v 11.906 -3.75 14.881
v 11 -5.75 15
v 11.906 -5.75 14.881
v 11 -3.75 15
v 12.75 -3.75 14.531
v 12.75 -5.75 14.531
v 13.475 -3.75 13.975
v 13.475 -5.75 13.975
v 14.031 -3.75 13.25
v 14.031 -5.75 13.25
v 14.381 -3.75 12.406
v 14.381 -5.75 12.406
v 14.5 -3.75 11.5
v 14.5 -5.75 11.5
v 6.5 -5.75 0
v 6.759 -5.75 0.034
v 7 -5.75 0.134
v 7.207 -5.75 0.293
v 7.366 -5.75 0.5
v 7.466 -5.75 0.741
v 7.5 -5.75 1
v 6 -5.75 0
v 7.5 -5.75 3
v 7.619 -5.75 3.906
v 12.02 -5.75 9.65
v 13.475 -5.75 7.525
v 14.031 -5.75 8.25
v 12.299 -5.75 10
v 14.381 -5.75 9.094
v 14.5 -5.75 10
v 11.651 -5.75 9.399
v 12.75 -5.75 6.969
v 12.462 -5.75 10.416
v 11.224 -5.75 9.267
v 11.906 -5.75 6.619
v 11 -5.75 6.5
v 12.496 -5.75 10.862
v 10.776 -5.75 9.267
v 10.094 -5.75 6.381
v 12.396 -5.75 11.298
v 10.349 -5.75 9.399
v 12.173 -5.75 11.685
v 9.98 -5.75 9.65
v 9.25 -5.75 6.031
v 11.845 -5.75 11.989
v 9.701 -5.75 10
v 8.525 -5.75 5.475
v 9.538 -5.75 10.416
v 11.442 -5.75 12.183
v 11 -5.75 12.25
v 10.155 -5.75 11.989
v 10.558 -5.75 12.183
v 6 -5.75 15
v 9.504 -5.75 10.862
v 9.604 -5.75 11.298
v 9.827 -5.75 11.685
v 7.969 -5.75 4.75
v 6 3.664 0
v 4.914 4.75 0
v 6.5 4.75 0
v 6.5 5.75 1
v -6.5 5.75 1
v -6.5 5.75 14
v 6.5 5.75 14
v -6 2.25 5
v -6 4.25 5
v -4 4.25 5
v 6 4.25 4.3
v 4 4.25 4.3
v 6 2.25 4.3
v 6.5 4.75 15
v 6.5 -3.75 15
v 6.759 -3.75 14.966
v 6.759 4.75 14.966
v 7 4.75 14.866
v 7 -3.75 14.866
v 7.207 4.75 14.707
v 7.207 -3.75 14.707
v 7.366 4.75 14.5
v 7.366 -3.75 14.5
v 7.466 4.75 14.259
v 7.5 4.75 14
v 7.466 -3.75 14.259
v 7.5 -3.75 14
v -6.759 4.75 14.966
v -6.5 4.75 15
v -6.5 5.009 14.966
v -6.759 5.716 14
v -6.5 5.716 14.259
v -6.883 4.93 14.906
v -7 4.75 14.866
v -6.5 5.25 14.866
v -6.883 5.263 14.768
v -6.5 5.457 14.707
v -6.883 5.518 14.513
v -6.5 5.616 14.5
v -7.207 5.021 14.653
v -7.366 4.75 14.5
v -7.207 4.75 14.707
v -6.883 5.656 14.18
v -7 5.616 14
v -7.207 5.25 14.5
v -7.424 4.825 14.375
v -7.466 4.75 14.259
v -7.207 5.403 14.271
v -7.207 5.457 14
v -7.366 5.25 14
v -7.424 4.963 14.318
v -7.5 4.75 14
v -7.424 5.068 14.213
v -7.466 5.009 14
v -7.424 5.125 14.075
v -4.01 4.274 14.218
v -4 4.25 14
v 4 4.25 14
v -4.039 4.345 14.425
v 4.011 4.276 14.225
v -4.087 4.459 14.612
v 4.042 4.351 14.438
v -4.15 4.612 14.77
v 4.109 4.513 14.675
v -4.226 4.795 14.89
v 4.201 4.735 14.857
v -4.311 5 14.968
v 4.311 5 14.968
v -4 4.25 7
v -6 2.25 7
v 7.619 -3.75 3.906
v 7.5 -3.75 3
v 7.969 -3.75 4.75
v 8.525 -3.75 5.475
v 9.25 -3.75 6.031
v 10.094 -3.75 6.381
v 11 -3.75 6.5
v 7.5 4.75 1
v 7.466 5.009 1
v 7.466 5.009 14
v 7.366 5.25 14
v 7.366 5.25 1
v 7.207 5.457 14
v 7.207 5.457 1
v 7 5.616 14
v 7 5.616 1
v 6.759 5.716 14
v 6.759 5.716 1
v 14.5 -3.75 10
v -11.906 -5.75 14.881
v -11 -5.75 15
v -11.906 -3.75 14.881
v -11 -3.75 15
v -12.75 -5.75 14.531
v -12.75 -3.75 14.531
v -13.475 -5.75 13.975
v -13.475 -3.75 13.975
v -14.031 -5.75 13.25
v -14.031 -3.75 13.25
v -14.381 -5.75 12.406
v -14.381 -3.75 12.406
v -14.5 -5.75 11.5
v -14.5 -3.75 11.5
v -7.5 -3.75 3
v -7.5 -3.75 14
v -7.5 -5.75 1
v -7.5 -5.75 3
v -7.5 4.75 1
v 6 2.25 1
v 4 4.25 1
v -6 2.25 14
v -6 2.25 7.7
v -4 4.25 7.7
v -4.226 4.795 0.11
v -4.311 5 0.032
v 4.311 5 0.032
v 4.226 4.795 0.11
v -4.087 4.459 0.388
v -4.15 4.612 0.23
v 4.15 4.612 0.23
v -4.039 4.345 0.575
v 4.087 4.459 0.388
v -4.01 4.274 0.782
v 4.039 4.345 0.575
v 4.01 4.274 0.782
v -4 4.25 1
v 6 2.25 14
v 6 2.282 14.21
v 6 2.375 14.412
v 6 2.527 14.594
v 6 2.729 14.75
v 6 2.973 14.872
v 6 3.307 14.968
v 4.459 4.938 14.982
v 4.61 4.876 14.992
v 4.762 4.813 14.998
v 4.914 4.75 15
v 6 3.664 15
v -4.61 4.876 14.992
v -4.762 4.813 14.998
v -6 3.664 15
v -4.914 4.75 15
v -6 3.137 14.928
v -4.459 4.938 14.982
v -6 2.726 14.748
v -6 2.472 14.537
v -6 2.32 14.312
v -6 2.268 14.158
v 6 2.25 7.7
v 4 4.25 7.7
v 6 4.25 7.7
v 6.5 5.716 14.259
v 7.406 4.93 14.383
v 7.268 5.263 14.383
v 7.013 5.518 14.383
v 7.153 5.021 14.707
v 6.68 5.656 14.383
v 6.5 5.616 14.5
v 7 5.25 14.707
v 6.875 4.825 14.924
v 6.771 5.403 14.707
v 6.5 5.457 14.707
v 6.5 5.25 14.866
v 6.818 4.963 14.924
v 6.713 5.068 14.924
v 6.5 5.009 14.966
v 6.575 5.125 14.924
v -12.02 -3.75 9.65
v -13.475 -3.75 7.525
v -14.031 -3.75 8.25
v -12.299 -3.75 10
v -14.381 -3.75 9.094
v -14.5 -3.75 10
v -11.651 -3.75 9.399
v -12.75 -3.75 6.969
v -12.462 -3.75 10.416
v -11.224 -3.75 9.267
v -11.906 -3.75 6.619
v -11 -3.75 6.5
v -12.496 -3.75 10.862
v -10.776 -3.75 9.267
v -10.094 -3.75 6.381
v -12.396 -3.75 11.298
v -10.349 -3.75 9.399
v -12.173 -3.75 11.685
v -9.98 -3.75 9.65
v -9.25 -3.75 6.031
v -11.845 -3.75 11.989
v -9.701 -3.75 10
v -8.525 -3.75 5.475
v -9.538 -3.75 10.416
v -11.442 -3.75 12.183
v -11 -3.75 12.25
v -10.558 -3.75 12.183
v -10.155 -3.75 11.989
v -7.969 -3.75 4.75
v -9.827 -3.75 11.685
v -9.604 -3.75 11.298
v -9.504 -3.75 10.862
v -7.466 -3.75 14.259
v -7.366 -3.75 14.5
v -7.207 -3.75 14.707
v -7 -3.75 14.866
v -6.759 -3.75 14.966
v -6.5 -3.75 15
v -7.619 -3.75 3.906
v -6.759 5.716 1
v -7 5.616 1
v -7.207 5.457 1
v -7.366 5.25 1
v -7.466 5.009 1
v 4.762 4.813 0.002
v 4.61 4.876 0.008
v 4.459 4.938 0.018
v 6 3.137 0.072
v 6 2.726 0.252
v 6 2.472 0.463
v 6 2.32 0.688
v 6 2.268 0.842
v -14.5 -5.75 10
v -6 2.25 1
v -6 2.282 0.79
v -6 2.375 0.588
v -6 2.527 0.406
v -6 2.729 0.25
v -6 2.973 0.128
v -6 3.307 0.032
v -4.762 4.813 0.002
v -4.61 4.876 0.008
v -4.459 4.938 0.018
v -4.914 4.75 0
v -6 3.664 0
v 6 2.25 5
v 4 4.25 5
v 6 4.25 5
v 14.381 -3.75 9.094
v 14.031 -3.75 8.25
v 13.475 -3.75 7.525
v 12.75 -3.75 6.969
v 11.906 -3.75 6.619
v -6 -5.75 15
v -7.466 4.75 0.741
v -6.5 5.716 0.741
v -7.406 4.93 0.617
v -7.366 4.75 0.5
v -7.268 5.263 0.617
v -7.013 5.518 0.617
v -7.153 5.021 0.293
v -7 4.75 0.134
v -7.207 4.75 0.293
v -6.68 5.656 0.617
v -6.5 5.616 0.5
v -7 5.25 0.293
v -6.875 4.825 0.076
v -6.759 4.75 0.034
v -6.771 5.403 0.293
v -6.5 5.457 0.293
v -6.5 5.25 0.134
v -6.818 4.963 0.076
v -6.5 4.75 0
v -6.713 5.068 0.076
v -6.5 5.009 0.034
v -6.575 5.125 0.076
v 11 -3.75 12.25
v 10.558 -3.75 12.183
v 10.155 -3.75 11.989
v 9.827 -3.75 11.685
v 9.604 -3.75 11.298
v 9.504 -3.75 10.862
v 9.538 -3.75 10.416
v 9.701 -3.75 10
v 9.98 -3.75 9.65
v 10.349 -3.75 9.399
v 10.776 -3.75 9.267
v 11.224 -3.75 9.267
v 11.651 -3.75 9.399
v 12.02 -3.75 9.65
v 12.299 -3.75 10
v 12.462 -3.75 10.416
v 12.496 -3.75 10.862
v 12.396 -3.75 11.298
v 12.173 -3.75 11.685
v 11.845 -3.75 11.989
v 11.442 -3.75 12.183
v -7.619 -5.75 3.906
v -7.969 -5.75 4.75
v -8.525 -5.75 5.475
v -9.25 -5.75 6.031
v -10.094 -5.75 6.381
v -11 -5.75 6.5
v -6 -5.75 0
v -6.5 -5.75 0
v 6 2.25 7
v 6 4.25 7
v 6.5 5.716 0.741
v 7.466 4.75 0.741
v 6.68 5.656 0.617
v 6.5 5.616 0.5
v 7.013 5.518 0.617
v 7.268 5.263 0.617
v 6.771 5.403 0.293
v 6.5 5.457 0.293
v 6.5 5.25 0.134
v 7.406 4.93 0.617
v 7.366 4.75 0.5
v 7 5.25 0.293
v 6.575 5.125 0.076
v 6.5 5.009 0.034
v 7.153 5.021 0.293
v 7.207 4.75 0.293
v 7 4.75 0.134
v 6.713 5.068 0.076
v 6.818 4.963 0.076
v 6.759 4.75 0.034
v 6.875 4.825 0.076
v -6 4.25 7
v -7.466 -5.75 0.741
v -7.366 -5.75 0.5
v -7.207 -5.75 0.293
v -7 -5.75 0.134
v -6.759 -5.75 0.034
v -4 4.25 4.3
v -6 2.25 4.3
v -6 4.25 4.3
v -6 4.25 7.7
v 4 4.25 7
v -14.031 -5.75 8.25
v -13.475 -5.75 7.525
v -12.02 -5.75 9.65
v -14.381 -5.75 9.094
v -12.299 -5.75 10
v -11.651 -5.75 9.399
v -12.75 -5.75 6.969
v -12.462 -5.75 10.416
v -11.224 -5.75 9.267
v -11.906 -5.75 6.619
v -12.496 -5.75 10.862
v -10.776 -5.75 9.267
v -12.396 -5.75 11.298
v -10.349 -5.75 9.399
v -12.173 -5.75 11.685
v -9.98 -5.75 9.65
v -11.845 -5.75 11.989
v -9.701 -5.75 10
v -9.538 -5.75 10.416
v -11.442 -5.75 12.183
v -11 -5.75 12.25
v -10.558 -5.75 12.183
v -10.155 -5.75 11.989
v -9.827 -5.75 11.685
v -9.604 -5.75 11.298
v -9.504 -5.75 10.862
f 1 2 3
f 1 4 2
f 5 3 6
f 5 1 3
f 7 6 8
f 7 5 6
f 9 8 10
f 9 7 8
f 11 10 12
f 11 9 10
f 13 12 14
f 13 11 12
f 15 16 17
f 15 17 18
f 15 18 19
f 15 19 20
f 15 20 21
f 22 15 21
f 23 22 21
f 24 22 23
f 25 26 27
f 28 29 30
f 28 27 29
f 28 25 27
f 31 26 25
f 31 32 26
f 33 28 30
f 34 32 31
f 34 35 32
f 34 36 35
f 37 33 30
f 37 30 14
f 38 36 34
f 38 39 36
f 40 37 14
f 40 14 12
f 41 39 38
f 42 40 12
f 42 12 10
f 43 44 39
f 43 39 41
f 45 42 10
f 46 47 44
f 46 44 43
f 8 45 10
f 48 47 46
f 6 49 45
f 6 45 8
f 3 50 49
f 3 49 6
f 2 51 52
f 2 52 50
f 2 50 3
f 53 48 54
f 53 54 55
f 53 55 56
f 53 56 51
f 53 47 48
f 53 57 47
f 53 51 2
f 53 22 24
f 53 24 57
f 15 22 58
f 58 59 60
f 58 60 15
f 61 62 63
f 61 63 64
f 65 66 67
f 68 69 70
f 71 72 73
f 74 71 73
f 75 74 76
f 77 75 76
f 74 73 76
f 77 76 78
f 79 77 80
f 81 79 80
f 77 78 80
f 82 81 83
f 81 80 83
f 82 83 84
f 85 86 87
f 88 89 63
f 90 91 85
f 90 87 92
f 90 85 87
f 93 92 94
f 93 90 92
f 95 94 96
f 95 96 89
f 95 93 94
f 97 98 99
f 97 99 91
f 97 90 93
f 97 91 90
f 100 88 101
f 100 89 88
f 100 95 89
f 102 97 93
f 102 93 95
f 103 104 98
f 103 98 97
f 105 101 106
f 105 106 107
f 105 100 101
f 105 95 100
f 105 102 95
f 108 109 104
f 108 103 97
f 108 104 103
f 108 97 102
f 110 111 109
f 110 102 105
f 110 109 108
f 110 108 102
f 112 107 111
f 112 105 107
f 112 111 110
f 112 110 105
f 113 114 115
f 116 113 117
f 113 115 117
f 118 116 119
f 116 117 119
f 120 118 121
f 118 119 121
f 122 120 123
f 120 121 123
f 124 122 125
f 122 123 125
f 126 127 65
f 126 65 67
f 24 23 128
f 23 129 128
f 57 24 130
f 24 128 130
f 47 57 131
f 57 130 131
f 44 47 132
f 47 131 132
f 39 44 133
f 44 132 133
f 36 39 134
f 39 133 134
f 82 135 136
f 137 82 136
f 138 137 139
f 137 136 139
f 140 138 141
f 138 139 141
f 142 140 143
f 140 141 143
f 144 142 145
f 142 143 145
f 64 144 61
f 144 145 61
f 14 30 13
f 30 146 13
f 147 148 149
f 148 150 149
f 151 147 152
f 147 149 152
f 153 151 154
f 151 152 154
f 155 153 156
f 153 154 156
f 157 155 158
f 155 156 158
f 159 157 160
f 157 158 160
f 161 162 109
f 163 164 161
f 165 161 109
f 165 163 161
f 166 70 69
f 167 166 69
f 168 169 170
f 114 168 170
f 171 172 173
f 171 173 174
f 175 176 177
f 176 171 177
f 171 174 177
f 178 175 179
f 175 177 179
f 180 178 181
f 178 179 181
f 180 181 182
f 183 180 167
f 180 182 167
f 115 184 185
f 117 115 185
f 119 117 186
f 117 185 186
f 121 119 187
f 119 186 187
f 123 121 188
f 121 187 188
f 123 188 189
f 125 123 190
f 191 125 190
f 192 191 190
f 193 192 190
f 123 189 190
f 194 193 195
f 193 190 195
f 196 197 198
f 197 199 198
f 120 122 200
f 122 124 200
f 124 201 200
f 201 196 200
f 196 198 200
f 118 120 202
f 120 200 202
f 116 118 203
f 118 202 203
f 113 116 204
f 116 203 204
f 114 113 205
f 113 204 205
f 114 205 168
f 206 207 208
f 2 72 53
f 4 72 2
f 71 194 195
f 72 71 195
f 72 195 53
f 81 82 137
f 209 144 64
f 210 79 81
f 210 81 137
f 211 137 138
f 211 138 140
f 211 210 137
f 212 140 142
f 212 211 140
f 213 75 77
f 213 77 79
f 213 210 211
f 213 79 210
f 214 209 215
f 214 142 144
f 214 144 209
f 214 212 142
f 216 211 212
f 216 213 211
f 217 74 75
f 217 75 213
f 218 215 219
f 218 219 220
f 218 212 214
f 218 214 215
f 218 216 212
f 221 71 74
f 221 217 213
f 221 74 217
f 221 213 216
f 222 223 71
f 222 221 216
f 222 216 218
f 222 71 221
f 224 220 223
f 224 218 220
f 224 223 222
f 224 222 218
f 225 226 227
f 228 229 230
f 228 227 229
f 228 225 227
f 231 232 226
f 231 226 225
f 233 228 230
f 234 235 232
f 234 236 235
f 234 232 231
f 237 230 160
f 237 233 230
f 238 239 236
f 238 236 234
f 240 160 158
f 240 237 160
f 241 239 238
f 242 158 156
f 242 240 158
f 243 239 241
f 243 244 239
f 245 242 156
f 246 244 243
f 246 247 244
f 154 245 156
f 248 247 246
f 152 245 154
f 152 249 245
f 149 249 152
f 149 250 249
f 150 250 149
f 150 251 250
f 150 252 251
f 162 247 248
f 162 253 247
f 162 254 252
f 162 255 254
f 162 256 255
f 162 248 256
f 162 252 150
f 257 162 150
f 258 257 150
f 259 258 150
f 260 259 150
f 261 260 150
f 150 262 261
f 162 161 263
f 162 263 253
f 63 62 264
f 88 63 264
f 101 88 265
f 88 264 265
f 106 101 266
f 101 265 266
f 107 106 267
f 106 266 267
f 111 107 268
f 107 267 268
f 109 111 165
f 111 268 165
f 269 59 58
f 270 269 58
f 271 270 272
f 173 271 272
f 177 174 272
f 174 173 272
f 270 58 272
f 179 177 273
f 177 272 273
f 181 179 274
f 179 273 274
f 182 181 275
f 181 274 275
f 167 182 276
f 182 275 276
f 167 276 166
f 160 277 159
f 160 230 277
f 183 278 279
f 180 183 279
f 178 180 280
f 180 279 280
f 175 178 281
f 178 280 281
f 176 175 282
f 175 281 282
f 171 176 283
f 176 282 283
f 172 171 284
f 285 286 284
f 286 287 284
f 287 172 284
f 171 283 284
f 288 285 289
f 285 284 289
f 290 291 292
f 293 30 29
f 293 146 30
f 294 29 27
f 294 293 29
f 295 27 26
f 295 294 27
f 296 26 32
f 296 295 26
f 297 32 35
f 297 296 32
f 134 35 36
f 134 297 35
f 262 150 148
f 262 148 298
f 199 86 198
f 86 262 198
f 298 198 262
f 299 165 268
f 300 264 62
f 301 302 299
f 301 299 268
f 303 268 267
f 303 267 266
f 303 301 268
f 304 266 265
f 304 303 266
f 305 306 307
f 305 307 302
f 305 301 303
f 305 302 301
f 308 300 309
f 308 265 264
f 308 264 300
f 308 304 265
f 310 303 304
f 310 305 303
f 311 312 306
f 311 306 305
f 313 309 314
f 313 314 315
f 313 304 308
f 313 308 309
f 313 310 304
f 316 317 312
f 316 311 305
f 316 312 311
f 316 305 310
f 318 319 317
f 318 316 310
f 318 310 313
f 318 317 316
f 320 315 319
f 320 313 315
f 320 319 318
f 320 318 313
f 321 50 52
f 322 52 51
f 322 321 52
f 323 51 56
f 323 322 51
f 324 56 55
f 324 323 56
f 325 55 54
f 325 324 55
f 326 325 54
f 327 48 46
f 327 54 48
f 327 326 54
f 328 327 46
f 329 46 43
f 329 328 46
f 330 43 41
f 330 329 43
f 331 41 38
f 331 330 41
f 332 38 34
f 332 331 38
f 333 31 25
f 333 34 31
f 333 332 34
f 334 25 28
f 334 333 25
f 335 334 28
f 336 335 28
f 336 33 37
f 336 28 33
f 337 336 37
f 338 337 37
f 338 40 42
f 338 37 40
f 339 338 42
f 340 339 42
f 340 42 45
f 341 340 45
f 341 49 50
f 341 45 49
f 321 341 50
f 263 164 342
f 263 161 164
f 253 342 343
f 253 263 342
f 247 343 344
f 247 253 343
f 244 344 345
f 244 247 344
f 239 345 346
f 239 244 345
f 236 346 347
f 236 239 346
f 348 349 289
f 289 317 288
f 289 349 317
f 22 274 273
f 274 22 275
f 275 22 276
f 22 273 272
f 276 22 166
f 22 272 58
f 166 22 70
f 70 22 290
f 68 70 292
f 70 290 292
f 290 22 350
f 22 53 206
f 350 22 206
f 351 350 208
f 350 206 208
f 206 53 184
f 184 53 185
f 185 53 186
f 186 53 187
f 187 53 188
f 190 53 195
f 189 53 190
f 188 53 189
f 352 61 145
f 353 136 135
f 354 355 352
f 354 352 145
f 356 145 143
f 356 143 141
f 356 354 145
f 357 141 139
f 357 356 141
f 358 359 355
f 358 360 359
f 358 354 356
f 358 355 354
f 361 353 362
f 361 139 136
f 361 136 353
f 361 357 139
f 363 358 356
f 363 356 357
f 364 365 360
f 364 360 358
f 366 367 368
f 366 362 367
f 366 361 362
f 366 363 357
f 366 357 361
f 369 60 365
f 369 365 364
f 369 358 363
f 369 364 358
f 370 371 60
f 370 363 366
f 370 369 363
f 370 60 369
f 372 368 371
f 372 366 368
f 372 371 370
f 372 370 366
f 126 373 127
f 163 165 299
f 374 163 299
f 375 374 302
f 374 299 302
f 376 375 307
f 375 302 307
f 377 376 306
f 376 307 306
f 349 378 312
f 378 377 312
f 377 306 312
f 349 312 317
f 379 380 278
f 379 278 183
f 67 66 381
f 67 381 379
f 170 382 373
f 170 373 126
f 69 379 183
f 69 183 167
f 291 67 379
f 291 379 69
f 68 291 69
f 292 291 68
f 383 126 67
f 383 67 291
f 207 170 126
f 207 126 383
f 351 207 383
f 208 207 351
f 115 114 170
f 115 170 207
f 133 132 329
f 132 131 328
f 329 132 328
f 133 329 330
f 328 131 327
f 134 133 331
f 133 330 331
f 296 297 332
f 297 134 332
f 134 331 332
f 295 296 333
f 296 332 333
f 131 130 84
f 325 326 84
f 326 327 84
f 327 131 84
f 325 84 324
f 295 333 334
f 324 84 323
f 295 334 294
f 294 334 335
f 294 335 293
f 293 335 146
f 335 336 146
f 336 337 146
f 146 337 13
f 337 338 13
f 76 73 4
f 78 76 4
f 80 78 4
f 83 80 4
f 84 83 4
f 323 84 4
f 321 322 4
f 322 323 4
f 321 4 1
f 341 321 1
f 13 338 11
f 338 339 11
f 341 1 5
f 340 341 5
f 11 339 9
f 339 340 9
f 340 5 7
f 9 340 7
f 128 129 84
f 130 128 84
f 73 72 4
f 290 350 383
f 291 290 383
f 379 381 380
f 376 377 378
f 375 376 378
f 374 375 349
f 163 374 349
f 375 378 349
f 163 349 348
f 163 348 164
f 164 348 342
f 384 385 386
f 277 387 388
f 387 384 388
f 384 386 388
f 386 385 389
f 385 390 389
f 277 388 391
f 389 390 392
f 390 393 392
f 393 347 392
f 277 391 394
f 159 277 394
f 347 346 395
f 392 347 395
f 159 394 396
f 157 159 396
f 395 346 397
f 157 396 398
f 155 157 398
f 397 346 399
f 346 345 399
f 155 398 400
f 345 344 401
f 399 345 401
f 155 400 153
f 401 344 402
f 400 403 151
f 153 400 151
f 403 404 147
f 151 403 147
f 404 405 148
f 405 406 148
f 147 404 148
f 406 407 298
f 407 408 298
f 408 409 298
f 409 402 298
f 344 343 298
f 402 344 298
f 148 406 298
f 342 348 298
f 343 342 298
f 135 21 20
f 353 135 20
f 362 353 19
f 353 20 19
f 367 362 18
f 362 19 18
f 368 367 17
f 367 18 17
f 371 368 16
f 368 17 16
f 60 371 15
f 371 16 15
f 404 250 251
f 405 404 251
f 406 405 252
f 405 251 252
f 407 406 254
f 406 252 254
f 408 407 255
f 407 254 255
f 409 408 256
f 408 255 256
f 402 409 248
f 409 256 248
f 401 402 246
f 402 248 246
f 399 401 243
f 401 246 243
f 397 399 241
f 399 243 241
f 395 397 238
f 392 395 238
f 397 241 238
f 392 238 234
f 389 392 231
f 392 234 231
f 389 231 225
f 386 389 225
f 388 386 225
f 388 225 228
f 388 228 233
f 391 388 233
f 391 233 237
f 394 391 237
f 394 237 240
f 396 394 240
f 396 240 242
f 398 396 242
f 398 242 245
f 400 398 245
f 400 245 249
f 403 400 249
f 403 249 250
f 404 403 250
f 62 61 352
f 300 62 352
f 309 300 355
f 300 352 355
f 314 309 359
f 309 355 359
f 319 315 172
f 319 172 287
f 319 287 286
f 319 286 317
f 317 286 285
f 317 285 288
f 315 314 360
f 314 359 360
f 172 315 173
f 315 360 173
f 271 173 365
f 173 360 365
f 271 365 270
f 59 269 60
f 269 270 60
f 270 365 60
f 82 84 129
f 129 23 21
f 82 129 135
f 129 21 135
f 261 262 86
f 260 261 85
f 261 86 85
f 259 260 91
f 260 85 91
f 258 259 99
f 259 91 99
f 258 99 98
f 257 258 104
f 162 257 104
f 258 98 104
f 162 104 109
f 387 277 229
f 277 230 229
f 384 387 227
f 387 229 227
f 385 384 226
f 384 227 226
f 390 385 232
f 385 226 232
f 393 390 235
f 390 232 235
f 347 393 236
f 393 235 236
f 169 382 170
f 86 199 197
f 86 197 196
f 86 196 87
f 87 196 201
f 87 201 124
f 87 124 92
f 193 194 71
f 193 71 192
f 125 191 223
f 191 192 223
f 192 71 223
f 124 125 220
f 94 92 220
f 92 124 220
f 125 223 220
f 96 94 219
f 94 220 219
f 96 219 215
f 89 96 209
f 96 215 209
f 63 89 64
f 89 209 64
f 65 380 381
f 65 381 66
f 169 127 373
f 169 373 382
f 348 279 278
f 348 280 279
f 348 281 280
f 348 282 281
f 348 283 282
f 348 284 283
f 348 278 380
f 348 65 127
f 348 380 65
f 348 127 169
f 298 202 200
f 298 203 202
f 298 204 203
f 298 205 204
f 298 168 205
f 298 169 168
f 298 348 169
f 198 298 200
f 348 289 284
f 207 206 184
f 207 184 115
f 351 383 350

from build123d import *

# Parameters (mm, degrees)
SKETCH2_W           = 15
SKETCH2_H           = 11.5
BOSS_EXTRUDE1_DEPTH = 15
SKETCH3_W           = 12
SKETCH3_H           = 10
CUT_EXTRUDE1_DEPTH  = 15
SKETCH4_W           = 8.5
SKETCH4_H           = 2
BOSS_EXTRUDE2_DEPTH = 7
SKETCH5_R           = 1.5
CUT_EXTRUDE2_DEPTH  = 7
BOSS_EXTRUDE3_DEPTH = 15
SKETCH7_W           = 12
SKETCH7_H           = 0.7
CUT_EXTRUDE3_DEPTH  = 3
FILLET2_R           = 3.5
FILLET3_R           = 1


# Some blends are built 0.0001 mm under size
with BuildPart() as part:
    # Sketch2 → Boss-Extrude1 (new body)
    with BuildSketch(Plane.XY):
        Rectangle(SKETCH2_W, SKETCH2_H)
    extrude(amount=BOSS_EXTRUDE1_DEPTH)

    # Sketch3 → Cut-Extrude1 (cut)
    with BuildSketch(Plane.XY.offset(15)):
        with Locations((0, -0.75)):
            Rectangle(SKETCH3_W, SKETCH3_H)
    extrude(amount=-CUT_EXTRUDE1_DEPTH, mode=Mode.SUBTRACT)

    # Sketch4 → Boss-Extrude2 (add)
    with BuildSketch(Plane.ZY.offset(7.5)):
        with Locations((10.75, -4.75)):
            Rectangle(SKETCH4_W, SKETCH4_H)
    boss_extrude2 = extrude(amount=BOSS_EXTRUDE2_DEPTH)

    # Sketch5 → Cut-Extrude2 (cut)
    with BuildSketch(Plane(origin=(0, -3.75, 0), x_dir=(1, 0, 0), z_dir=(0, 1, 0))):
        with Locations(Location((-11, -10.75, 0), (0, 0, 270))):
            Circle(SKETCH5_R)
    cut_extrude2 = extrude(amount=-CUT_EXTRUDE2_DEPTH, mode=Mode.SUBTRACT)

    # Mirror3: Boss-Extrude2, Cut-Extrude2 across plane
    add(boss_extrude2.mirror(Plane(origin=(0, 0, 0), x_dir=(0, 0, 1), z_dir=(1, 0, 0))))
    add(cut_extrude2.mirror(Plane(origin=(0, 0, 0), x_dir=(0, 0, 1), z_dir=(1, 0, 0))), mode=Mode.SUBTRACT)

    # Sketch6 → Boss-Extrude3 (add)
    with BuildSketch(Plane.XY.offset(15)):
        Polygon((-6, 2.25), (-4, 4.25), (-6, 4.25), align=None)
        Polygon((4, 4.25), (6, 4.25), (6, 2.25), align=None)
    extrude(amount=-BOSS_EXTRUDE3_DEPTH)

    # Sketch7 → Cut-Extrude3 (cut)
    with BuildSketch(Plane.XZ.offset(-4.25)):
        with Locations((0, 4.65)):
            Rectangle(SKETCH7_W, SKETCH7_H)
        with Locations((0, 7.35)):
            Rectangle(SKETCH7_W, SKETCH7_H)
    extrude(amount=CUT_EXTRUDE3_DEPTH, mode=Mode.SUBTRACT)

    # Fillet2
    fillet2_edges = [part.edges().sort_by_distance(p)[0] for p in [
        (-7.5, -4.75, 6.5),
        (7.5, -4.75, 6.5),
        (14.5, -4.75, 15),
        (14.5, -4.75, 6.5),
        (-14.5, -4.75, 15),
        (-14.5, -4.75, 6.5),
    ]]
    fillet(fillet2_edges, radius=FILLET2_R - 0.0001)  # a hair under: the kernel refuses the full size

    # Fillet3
    # the kernel refuses this fillet: 1 mm, written as the material it takes off along each edge
    with BuildSketch(Plane(origin=(-6.5, 4.75, 14), x_dir=(0, 0, 1), z_dir=(-1, 0, 0))) as fillet3_piece_1_section:
        Polygon((0, 0), (FILLET3_R, 0), (FILLET3_R, FILLET3_R), (0, FILLET3_R), align=None)
    fillet3_piece_1 = extrude(amount=FILLET3_R, mode=Mode.PRIVATE)
    fillet3_piece_1 = fillet3_piece_1 - Plane(origin=(-6.5, 4.75, 14), x_dir=(0, -0.7071067811865475, -0.7071067811865475), z_dir=(-1, 0, 0)) * Sphere(FILLET3_R, mode=Mode.PRIVATE)
    add(fillet3_piece_1, mode=Mode.SUBTRACT)
    with BuildSketch(Plane(origin=(6.5, 4.75, 14), x_dir=(1, 0, 0), z_dir=(0, 0, 1))) as fillet3_piece_2_section:
        Polygon((0, 0), (FILLET3_R, 0), (FILLET3_R, FILLET3_R), (0, FILLET3_R), align=None)
    fillet3_piece_2 = extrude(amount=FILLET3_R, mode=Mode.PRIVATE)
    fillet3_piece_2 = fillet3_piece_2 - Plane(origin=(6.5, 4.75, 14), x_dir=(-0.7071067811865475, -0.7071067811865475, 0), z_dir=(0, 0, 1)) * Sphere(FILLET3_R, mode=Mode.PRIVATE)
    add(fillet3_piece_2, mode=Mode.SUBTRACT)
    with BuildSketch(Plane(origin=(-6.5, 4.75, 1), x_dir=(-1, 0, 0), z_dir=(0, 0, -1))) as fillet3_piece_3_section:
        Polygon((0, 0), (FILLET3_R, 0), (FILLET3_R, FILLET3_R), (0, FILLET3_R), align=None)
    fillet3_piece_3 = extrude(amount=FILLET3_R, mode=Mode.PRIVATE)
    fillet3_piece_3 = fillet3_piece_3 - Plane(origin=(-6.5, 4.75, 1), x_dir=(0.7071067811865475, -0.7071067811865475, 0), z_dir=(0, 0, -1)) * Sphere(FILLET3_R, mode=Mode.PRIVATE)
    add(fillet3_piece_3, mode=Mode.SUBTRACT)
    with BuildSketch(Plane(origin=(6.5, 4.75, 1), x_dir=(1, 0, 0), z_dir=(0, 0, -1))) as fillet3_piece_4_section:
        Polygon((0, 0), (FILLET3_R, 0), (FILLET3_R, -FILLET3_R), (0, -FILLET3_R), align=None)
    fillet3_piece_4 = extrude(amount=FILLET3_R, mode=Mode.PRIVATE)
    fillet3_piece_4 = fillet3_piece_4 - Plane(origin=(6.5, 4.75, 1), x_dir=(-0.7071067811865475, -0.7071067811865475, 0), z_dir=(0, 0, -1)) * Sphere(FILLET3_R, mode=Mode.PRIVATE)
    add(fillet3_piece_4, mode=Mode.SUBTRACT)
    with BuildSketch(Plane(origin=(-7.5, 4.75, 15), x_dir=(1, 0, 0), z_dir=(0, -1, 0)), Plane(origin=(7.5, -3.75, 15), x_dir=(-1, 0, 0), z_dir=(0, 1, 0))) as fillet3_piece_5:
        with BuildLine():
            CenterArc((FILLET3_R, -FILLET3_R), FILLET3_R, 90, 90)
            Line((0, -FILLET3_R), (0, 0))
            Line((0, 0), (FILLET3_R, 0))
        make_face()
    extrude(amount=8.5, mode=Mode.SUBTRACT)
    with BuildSketch(Plane(origin=(-7.5, 4.75, 0), x_dir=(1, 0, 0), z_dir=(0, -1, 0))) as fillet3_piece_6:
        with BuildLine():
            CenterArc((FILLET3_R, FILLET3_R), FILLET3_R, 180, 90)
            Line((0, FILLET3_R), (0, 0))
            Line((0, 0), (FILLET3_R, 0))
        make_face()
    extrude(amount=13, mode=Mode.SUBTRACT)
    with BuildSketch(Plane(origin=(6.5, 5.75, 0), x_dir=(0, 0, 1), z_dir=(-1, 0, 0)), Plane(origin=(7.5, -8.25, 0), x_dir=(0, 0, 1), z_dir=(0, 1, 0)), Plane(origin=(-7.5, 5.75, 1), x_dir=(1, 0, 0), z_dir=(0, 0, 1)), Plane(origin=(7.5, 5.75, 1), x_dir=(0, -1, 0), z_dir=(0, 0, 1)), Plane(origin=(6.5, 5.75, 15), x_dir=(0, -1, 0), z_dir=(-1, 0, 0))) as fillet3_piece_7:
        with BuildLine():
            CenterArc((FILLET3_R, -FILLET3_R), FILLET3_R, 90, 90)
            Line((0, -FILLET3_R), (0, 0))
            Line((0, 0), (FILLET3_R, 0))
        make_face()
    extrude(amount=13, mode=Mode.SUBTRACT)
    with BuildSketch(Plane(origin=(-7.767766953, 0.482233047, 15), x_dir=(-0.7071067811865476, 0.7071067811865477, 0), z_dir=(0.7071067811865476, 0.7071067811865475, 0))) as fillet3_piece_8_section:
        with BuildLine():
            CenterArc((FILLET3_R, -FILLET3_R), FILLET3_R, 90, 90)
            Line((0, -FILLET3_R), (0, 0))
            Line((0, 0), (FILLET3_R, 0))
        make_face()
    fillet3_piece_8 = extrude(amount=7.828427125, mode=Mode.PRIVATE)
    fillet3_piece_8 = split(fillet3_piece_8, bisect_by=Plane(origin=(-5.132418039, 4.25, 14.750489644), z_dir=(0, -1, 0)), keep=Keep.TOP, mode=Mode.PRIVATE)
    fillet3_piece_8 = split(fillet3_piece_8, bisect_by=Plane(origin=(-6, 3.382418039, 14.750489644), z_dir=(1, 0, 0)), keep=Keep.TOP, mode=Mode.PRIVATE)
    add(fillet3_piece_8, mode=Mode.SUBTRACT)
    with BuildSketch(Plane(origin=(-7.767766953, 0.482233047, 0), x_dir=(0, 0, 1), z_dir=(0.7071067811865476, 0.7071067811865475, 0))) as fillet3_piece_9_section:
        with BuildLine():
            CenterArc((FILLET3_R, -FILLET3_R), FILLET3_R, 90, 90)
            Line((0, -FILLET3_R), (0, 0))
            Line((0, 0), (FILLET3_R, 0))
        make_face()
    fillet3_piece_9 = extrude(amount=7.828427125, mode=Mode.PRIVATE)
    fillet3_piece_9 = split(fillet3_piece_9, bisect_by=Plane(origin=(-5.132418039, 4.25, 0.249510356), z_dir=(0, -1, 0)), keep=Keep.TOP, mode=Mode.PRIVATE)
    fillet3_piece_9 = split(fillet3_piece_9, bisect_by=Plane(origin=(-6, 3.382418039, 0.249510356), z_dir=(1, 0, 0)), keep=Keep.TOP, mode=Mode.PRIVATE)
    add(fillet3_piece_9, mode=Mode.SUBTRACT)
    with BuildSketch(Plane(origin=(6.5, 4.25, 15), x_dir=(0, 1, 0), z_dir=(-1, 0, 0))) as fillet3_piece_10_section:
        with BuildLine():
            CenterArc((FILLET3_R, FILLET3_R), FILLET3_R, 180, 90)
            Line((0, FILLET3_R), (0, 0))
            Line((0, 0), (FILLET3_R, 0))
        make_face()
    fillet3_piece_10 = extrude(amount=13, mode=Mode.PRIVATE)
    fillet3_piece_10 = split(fillet3_piece_10, bisect_by=Plane(origin=(1.892960565, 6.357039435, 14.766328896), z_dir=(-0.7071067811865475, -0.7071067811865476, 0)), keep=Keep.TOP, mode=Mode.PRIVATE)
    fillet3_piece_10 = split(fillet3_piece_10, bisect_by=Plane(origin=(-1.892960565, 6.357039435, 14.766328896), z_dir=(0.7071067811865475, -0.7071067811865476, 0)), keep=Keep.TOP, mode=Mode.PRIVATE)
    add(fillet3_piece_10, mode=Mode.SUBTRACT)
    with BuildSketch(Plane(origin=(6.5, 4.25, 0), x_dir=(0, 0, 1), z_dir=(-1, 0, 0))) as fillet3_piece_11_section:
        with BuildLine():
            CenterArc((FILLET3_R, FILLET3_R), FILLET3_R, 180, 90)
            Line((0, FILLET3_R), (0, 0))
            Line((0, 0), (FILLET3_R, 0))
        make_face()
    fillet3_piece_11 = extrude(amount=13, mode=Mode.PRIVATE)
    fillet3_piece_11 = split(fillet3_piece_11, bisect_by=Plane(origin=(1.892960565, 6.357039435, 0.233671104), z_dir=(-0.7071067811865475, -0.7071067811865476, 0)), keep=Keep.TOP, mode=Mode.PRIVATE)
    fillet3_piece_11 = split(fillet3_piece_11, bisect_by=Plane(origin=(-1.892960565, 6.357039435, 0.233671104), z_dir=(0.7071067811865475, -0.7071067811865476, 0)), keep=Keep.TOP, mode=Mode.PRIVATE)
    add(fillet3_piece_11, mode=Mode.SUBTRACT)
    with BuildSketch(Plane(origin=(7.767766953, 0.482233047, 15), x_dir=(0.7071067811865476, 0.7071067811865477, 0), z_dir=(-0.7071067811865476, 0.7071067811865475, 0))) as fillet3_piece_12_section:
        with BuildLine():
            CenterArc((FILLET3_R, FILLET3_R), FILLET3_R, 180, 90)
            Line((0, FILLET3_R), (0, 0))
            Line((0, 0), (FILLET3_R, 0))
        make_face()
    fillet3_piece_12 = extrude(amount=7.828427125, mode=Mode.PRIVATE)
    fillet3_piece_12 = split(fillet3_piece_12, bisect_by=Plane(origin=(6, 3.382418039, 14.750489644), z_dir=(-1, 0, 0)), keep=Keep.TOP, mode=Mode.PRIVATE)
    fillet3_piece_12 = split(fillet3_piece_12, bisect_by=Plane(origin=(5.132418039, 4.25, 14.750489644), z_dir=(0, -1, 0)), keep=Keep.TOP, mode=Mode.PRIVATE)
    add(fillet3_piece_12, mode=Mode.SUBTRACT)
    with BuildSketch(Plane(origin=(7.767766953, 0.482233047, 0), x_dir=(0, 0, 1), z_dir=(-0.7071067811865476, 0.7071067811865475, 0))) as fillet3_piece_13_section:
        with BuildLine():
            CenterArc((FILLET3_R, FILLET3_R), FILLET3_R, 180, 90)
            Line((0, FILLET3_R), (0, 0))
            Line((0, 0), (FILLET3_R, 0))
        make_face()
    fillet3_piece_13 = extrude(amount=7.828427125, mode=Mode.PRIVATE)
    fillet3_piece_13 = split(fillet3_piece_13, bisect_by=Plane(origin=(6, 3.382418039, 0.249510356), z_dir=(-1, 0, 0)), keep=Keep.TOP, mode=Mode.PRIVATE)
    fillet3_piece_13 = split(fillet3_piece_13, bisect_by=Plane(origin=(5.132418039, 4.25, 0.249510356), z_dir=(0, -1, 0)), keep=Keep.TOP, mode=Mode.PRIVATE)
    add(fillet3_piece_13, mode=Mode.SUBTRACT)
    with BuildSketch(Plane(origin=(-7.767766953, 0.482233047, 15), x_dir=(-0.7071067811865476, 0.7071067811865477, 0), z_dir=(0.7071067811865476, 0.7071067811865475, 0))) as fillet3_piece_14a_section:
        with BuildLine():
            CenterArc((FILLET3_R, -FILLET3_R), FILLET3_R, 90, 90)
            Line((0, -FILLET3_R), (0, 0))
            Line((0, 0), (FILLET3_R, 0))
        make_face()
    fillet3_piece_14a = extrude(amount=7.828427125, mode=Mode.PRIVATE)
    fillet3_piece_14a = split(fillet3_piece_14a, bisect_by=Plane(origin=(-3.374325792, 4.25, 14.783675587), z_dir=(0, 1, 0)), keep=Keep.TOP, mode=Mode.PRIVATE)
    with BuildSketch(Plane(origin=(6.5, 4.25, 15), x_dir=(0, 1, 0), z_dir=(-1, 0, 0))) as fillet3_piece_14b_section:
        with BuildLine():
            CenterArc((FILLET3_R, FILLET3_R), FILLET3_R, 180, 90)
            Line((0, FILLET3_R), (0, 0))
            Line((0, 0), (FILLET3_R, 0))
        make_face()
    fillet3_piece_14b = extrude(amount=13, mode=Mode.PRIVATE)
    fillet3_piece_14b = split(fillet3_piece_14b, bisect_by=Plane(origin=(-4.442418475, 3.807581525, 14.783675587), z_dir=(-0.7071067811865475, 0.7071067811865476, 0)), keep=Keep.TOP, mode=Mode.PRIVATE)
    fillet3_piece_14 = fillet3_piece_14a & fillet3_piece_14b
    add(fillet3_piece_14, mode=Mode.SUBTRACT)
    with BuildSketch(Plane(origin=(6.5, 4.25, 0), x_dir=(0, 0, 1), z_dir=(-1, 0, 0))) as fillet3_piece_15a_section:
        with BuildLine():
            CenterArc((FILLET3_R, FILLET3_R), FILLET3_R, 180, 90)
            Line((0, FILLET3_R), (0, 0))
            Line((0, 0), (FILLET3_R, 0))
        make_face()
    fillet3_piece_15a = extrude(amount=13, mode=Mode.PRIVATE)
    fillet3_piece_15a = split(fillet3_piece_15a, bisect_by=Plane(origin=(-4.442418475, 3.807581525, 0.216324413), z_dir=(-0.7071067811865475, 0.7071067811865476, 0)), keep=Keep.TOP, mode=Mode.PRIVATE)
    with BuildSketch(Plane(origin=(-7.767766953, 0.482233047, 0), x_dir=(0, 0, 1), z_dir=(0.7071067811865476, 0.7071067811865475, 0))) as fillet3_piece_15b_section:
        with BuildLine():
            CenterArc((FILLET3_R, -FILLET3_R), FILLET3_R, 90, 90)
            Line((0, -FILLET3_R), (0, 0))
            Line((0, 0), (FILLET3_R, 0))
        make_face()
    fillet3_piece_15b = extrude(amount=7.828427125, mode=Mode.PRIVATE)
    fillet3_piece_15b = split(fillet3_piece_15b, bisect_by=Plane(origin=(-3.374325792, 4.25, 0.216324413), z_dir=(0, 1, 0)), keep=Keep.TOP, mode=Mode.PRIVATE)
    fillet3_piece_15 = fillet3_piece_15a & fillet3_piece_15b
    add(fillet3_piece_15, mode=Mode.SUBTRACT)
    with BuildSketch(Plane(origin=(6.5, 4.25, 15), x_dir=(0, 1, 0), z_dir=(-1, 0, 0))) as fillet3_piece_16a_section:
        with BuildLine():
            CenterArc((FILLET3_R, FILLET3_R), FILLET3_R, 180, 90)
            Line((0, FILLET3_R), (0, 0))
            Line((0, 0), (FILLET3_R, 0))
        make_face()
    fillet3_piece_16a = extrude(amount=13, mode=Mode.PRIVATE)
    fillet3_piece_16a = split(fillet3_piece_16a, bisect_by=Plane(origin=(4.442418475, 3.807581525, 14.783675587), z_dir=(0.7071067811865475, 0.7071067811865476, 0)), keep=Keep.TOP, mode=Mode.PRIVATE)
    with BuildSketch(Plane(origin=(7.767766953, 0.482233047, 15), x_dir=(0.7071067811865476, 0.7071067811865477, 0), z_dir=(-0.7071067811865476, 0.7071067811865475, 0))) as fillet3_piece_16b_section:
        with BuildLine():
            CenterArc((FILLET3_R, FILLET3_R), FILLET3_R, 180, 90)
            Line((0, FILLET3_R), (0, 0))
            Line((0, 0), (FILLET3_R, 0))
        make_face()
    fillet3_piece_16b = extrude(amount=7.828427125, mode=Mode.PRIVATE)
    fillet3_piece_16b = split(fillet3_piece_16b, bisect_by=Plane(origin=(3.374325792, 4.25, 14.783675587), z_dir=(0, 1, 0)), keep=Keep.TOP, mode=Mode.PRIVATE)
    fillet3_piece_16 = fillet3_piece_16a & fillet3_piece_16b
    add(fillet3_piece_16, mode=Mode.SUBTRACT)
    with BuildSketch(Plane(origin=(7.767766953, 0.482233047, 0), x_dir=(0, 0, 1), z_dir=(-0.7071067811865476, 0.7071067811865475, 0))) as fillet3_piece_17a_section:
        with BuildLine():
            CenterArc((FILLET3_R, FILLET3_R), FILLET3_R, 180, 90)
            Line((0, FILLET3_R), (0, 0))
            Line((0, 0), (FILLET3_R, 0))
        make_face()
    fillet3_piece_17a = extrude(amount=7.828427125, mode=Mode.PRIVATE)
    fillet3_piece_17a = split(fillet3_piece_17a, bisect_by=Plane(origin=(3.374325792, 4.25, 0.216324413), z_dir=(0, 1, 0)), keep=Keep.TOP, mode=Mode.PRIVATE)
    with BuildSketch(Plane(origin=(6.5, 4.25, 0), x_dir=(0, 0, 1), z_dir=(-1, 0, 0))) as fillet3_piece_17b_section:
        with BuildLine():
            CenterArc((FILLET3_R, FILLET3_R), FILLET3_R, 180, 90)
            Line((0, FILLET3_R), (0, 0))
            Line((0, 0), (FILLET3_R, 0))
        make_face()
    fillet3_piece_17b = extrude(amount=13, mode=Mode.PRIVATE)
    fillet3_piece_17b = split(fillet3_piece_17b, bisect_by=Plane(origin=(4.442418475, 3.807581525, 0.216324413), z_dir=(0.7071067811865475, 0.7071067811865476, 0)), keep=Keep.TOP, mode=Mode.PRIVATE)
    fillet3_piece_17 = fillet3_piece_17a & fillet3_piece_17b
    add(fillet3_piece_17, mode=Mode.SUBTRACT)


solid = part.part
